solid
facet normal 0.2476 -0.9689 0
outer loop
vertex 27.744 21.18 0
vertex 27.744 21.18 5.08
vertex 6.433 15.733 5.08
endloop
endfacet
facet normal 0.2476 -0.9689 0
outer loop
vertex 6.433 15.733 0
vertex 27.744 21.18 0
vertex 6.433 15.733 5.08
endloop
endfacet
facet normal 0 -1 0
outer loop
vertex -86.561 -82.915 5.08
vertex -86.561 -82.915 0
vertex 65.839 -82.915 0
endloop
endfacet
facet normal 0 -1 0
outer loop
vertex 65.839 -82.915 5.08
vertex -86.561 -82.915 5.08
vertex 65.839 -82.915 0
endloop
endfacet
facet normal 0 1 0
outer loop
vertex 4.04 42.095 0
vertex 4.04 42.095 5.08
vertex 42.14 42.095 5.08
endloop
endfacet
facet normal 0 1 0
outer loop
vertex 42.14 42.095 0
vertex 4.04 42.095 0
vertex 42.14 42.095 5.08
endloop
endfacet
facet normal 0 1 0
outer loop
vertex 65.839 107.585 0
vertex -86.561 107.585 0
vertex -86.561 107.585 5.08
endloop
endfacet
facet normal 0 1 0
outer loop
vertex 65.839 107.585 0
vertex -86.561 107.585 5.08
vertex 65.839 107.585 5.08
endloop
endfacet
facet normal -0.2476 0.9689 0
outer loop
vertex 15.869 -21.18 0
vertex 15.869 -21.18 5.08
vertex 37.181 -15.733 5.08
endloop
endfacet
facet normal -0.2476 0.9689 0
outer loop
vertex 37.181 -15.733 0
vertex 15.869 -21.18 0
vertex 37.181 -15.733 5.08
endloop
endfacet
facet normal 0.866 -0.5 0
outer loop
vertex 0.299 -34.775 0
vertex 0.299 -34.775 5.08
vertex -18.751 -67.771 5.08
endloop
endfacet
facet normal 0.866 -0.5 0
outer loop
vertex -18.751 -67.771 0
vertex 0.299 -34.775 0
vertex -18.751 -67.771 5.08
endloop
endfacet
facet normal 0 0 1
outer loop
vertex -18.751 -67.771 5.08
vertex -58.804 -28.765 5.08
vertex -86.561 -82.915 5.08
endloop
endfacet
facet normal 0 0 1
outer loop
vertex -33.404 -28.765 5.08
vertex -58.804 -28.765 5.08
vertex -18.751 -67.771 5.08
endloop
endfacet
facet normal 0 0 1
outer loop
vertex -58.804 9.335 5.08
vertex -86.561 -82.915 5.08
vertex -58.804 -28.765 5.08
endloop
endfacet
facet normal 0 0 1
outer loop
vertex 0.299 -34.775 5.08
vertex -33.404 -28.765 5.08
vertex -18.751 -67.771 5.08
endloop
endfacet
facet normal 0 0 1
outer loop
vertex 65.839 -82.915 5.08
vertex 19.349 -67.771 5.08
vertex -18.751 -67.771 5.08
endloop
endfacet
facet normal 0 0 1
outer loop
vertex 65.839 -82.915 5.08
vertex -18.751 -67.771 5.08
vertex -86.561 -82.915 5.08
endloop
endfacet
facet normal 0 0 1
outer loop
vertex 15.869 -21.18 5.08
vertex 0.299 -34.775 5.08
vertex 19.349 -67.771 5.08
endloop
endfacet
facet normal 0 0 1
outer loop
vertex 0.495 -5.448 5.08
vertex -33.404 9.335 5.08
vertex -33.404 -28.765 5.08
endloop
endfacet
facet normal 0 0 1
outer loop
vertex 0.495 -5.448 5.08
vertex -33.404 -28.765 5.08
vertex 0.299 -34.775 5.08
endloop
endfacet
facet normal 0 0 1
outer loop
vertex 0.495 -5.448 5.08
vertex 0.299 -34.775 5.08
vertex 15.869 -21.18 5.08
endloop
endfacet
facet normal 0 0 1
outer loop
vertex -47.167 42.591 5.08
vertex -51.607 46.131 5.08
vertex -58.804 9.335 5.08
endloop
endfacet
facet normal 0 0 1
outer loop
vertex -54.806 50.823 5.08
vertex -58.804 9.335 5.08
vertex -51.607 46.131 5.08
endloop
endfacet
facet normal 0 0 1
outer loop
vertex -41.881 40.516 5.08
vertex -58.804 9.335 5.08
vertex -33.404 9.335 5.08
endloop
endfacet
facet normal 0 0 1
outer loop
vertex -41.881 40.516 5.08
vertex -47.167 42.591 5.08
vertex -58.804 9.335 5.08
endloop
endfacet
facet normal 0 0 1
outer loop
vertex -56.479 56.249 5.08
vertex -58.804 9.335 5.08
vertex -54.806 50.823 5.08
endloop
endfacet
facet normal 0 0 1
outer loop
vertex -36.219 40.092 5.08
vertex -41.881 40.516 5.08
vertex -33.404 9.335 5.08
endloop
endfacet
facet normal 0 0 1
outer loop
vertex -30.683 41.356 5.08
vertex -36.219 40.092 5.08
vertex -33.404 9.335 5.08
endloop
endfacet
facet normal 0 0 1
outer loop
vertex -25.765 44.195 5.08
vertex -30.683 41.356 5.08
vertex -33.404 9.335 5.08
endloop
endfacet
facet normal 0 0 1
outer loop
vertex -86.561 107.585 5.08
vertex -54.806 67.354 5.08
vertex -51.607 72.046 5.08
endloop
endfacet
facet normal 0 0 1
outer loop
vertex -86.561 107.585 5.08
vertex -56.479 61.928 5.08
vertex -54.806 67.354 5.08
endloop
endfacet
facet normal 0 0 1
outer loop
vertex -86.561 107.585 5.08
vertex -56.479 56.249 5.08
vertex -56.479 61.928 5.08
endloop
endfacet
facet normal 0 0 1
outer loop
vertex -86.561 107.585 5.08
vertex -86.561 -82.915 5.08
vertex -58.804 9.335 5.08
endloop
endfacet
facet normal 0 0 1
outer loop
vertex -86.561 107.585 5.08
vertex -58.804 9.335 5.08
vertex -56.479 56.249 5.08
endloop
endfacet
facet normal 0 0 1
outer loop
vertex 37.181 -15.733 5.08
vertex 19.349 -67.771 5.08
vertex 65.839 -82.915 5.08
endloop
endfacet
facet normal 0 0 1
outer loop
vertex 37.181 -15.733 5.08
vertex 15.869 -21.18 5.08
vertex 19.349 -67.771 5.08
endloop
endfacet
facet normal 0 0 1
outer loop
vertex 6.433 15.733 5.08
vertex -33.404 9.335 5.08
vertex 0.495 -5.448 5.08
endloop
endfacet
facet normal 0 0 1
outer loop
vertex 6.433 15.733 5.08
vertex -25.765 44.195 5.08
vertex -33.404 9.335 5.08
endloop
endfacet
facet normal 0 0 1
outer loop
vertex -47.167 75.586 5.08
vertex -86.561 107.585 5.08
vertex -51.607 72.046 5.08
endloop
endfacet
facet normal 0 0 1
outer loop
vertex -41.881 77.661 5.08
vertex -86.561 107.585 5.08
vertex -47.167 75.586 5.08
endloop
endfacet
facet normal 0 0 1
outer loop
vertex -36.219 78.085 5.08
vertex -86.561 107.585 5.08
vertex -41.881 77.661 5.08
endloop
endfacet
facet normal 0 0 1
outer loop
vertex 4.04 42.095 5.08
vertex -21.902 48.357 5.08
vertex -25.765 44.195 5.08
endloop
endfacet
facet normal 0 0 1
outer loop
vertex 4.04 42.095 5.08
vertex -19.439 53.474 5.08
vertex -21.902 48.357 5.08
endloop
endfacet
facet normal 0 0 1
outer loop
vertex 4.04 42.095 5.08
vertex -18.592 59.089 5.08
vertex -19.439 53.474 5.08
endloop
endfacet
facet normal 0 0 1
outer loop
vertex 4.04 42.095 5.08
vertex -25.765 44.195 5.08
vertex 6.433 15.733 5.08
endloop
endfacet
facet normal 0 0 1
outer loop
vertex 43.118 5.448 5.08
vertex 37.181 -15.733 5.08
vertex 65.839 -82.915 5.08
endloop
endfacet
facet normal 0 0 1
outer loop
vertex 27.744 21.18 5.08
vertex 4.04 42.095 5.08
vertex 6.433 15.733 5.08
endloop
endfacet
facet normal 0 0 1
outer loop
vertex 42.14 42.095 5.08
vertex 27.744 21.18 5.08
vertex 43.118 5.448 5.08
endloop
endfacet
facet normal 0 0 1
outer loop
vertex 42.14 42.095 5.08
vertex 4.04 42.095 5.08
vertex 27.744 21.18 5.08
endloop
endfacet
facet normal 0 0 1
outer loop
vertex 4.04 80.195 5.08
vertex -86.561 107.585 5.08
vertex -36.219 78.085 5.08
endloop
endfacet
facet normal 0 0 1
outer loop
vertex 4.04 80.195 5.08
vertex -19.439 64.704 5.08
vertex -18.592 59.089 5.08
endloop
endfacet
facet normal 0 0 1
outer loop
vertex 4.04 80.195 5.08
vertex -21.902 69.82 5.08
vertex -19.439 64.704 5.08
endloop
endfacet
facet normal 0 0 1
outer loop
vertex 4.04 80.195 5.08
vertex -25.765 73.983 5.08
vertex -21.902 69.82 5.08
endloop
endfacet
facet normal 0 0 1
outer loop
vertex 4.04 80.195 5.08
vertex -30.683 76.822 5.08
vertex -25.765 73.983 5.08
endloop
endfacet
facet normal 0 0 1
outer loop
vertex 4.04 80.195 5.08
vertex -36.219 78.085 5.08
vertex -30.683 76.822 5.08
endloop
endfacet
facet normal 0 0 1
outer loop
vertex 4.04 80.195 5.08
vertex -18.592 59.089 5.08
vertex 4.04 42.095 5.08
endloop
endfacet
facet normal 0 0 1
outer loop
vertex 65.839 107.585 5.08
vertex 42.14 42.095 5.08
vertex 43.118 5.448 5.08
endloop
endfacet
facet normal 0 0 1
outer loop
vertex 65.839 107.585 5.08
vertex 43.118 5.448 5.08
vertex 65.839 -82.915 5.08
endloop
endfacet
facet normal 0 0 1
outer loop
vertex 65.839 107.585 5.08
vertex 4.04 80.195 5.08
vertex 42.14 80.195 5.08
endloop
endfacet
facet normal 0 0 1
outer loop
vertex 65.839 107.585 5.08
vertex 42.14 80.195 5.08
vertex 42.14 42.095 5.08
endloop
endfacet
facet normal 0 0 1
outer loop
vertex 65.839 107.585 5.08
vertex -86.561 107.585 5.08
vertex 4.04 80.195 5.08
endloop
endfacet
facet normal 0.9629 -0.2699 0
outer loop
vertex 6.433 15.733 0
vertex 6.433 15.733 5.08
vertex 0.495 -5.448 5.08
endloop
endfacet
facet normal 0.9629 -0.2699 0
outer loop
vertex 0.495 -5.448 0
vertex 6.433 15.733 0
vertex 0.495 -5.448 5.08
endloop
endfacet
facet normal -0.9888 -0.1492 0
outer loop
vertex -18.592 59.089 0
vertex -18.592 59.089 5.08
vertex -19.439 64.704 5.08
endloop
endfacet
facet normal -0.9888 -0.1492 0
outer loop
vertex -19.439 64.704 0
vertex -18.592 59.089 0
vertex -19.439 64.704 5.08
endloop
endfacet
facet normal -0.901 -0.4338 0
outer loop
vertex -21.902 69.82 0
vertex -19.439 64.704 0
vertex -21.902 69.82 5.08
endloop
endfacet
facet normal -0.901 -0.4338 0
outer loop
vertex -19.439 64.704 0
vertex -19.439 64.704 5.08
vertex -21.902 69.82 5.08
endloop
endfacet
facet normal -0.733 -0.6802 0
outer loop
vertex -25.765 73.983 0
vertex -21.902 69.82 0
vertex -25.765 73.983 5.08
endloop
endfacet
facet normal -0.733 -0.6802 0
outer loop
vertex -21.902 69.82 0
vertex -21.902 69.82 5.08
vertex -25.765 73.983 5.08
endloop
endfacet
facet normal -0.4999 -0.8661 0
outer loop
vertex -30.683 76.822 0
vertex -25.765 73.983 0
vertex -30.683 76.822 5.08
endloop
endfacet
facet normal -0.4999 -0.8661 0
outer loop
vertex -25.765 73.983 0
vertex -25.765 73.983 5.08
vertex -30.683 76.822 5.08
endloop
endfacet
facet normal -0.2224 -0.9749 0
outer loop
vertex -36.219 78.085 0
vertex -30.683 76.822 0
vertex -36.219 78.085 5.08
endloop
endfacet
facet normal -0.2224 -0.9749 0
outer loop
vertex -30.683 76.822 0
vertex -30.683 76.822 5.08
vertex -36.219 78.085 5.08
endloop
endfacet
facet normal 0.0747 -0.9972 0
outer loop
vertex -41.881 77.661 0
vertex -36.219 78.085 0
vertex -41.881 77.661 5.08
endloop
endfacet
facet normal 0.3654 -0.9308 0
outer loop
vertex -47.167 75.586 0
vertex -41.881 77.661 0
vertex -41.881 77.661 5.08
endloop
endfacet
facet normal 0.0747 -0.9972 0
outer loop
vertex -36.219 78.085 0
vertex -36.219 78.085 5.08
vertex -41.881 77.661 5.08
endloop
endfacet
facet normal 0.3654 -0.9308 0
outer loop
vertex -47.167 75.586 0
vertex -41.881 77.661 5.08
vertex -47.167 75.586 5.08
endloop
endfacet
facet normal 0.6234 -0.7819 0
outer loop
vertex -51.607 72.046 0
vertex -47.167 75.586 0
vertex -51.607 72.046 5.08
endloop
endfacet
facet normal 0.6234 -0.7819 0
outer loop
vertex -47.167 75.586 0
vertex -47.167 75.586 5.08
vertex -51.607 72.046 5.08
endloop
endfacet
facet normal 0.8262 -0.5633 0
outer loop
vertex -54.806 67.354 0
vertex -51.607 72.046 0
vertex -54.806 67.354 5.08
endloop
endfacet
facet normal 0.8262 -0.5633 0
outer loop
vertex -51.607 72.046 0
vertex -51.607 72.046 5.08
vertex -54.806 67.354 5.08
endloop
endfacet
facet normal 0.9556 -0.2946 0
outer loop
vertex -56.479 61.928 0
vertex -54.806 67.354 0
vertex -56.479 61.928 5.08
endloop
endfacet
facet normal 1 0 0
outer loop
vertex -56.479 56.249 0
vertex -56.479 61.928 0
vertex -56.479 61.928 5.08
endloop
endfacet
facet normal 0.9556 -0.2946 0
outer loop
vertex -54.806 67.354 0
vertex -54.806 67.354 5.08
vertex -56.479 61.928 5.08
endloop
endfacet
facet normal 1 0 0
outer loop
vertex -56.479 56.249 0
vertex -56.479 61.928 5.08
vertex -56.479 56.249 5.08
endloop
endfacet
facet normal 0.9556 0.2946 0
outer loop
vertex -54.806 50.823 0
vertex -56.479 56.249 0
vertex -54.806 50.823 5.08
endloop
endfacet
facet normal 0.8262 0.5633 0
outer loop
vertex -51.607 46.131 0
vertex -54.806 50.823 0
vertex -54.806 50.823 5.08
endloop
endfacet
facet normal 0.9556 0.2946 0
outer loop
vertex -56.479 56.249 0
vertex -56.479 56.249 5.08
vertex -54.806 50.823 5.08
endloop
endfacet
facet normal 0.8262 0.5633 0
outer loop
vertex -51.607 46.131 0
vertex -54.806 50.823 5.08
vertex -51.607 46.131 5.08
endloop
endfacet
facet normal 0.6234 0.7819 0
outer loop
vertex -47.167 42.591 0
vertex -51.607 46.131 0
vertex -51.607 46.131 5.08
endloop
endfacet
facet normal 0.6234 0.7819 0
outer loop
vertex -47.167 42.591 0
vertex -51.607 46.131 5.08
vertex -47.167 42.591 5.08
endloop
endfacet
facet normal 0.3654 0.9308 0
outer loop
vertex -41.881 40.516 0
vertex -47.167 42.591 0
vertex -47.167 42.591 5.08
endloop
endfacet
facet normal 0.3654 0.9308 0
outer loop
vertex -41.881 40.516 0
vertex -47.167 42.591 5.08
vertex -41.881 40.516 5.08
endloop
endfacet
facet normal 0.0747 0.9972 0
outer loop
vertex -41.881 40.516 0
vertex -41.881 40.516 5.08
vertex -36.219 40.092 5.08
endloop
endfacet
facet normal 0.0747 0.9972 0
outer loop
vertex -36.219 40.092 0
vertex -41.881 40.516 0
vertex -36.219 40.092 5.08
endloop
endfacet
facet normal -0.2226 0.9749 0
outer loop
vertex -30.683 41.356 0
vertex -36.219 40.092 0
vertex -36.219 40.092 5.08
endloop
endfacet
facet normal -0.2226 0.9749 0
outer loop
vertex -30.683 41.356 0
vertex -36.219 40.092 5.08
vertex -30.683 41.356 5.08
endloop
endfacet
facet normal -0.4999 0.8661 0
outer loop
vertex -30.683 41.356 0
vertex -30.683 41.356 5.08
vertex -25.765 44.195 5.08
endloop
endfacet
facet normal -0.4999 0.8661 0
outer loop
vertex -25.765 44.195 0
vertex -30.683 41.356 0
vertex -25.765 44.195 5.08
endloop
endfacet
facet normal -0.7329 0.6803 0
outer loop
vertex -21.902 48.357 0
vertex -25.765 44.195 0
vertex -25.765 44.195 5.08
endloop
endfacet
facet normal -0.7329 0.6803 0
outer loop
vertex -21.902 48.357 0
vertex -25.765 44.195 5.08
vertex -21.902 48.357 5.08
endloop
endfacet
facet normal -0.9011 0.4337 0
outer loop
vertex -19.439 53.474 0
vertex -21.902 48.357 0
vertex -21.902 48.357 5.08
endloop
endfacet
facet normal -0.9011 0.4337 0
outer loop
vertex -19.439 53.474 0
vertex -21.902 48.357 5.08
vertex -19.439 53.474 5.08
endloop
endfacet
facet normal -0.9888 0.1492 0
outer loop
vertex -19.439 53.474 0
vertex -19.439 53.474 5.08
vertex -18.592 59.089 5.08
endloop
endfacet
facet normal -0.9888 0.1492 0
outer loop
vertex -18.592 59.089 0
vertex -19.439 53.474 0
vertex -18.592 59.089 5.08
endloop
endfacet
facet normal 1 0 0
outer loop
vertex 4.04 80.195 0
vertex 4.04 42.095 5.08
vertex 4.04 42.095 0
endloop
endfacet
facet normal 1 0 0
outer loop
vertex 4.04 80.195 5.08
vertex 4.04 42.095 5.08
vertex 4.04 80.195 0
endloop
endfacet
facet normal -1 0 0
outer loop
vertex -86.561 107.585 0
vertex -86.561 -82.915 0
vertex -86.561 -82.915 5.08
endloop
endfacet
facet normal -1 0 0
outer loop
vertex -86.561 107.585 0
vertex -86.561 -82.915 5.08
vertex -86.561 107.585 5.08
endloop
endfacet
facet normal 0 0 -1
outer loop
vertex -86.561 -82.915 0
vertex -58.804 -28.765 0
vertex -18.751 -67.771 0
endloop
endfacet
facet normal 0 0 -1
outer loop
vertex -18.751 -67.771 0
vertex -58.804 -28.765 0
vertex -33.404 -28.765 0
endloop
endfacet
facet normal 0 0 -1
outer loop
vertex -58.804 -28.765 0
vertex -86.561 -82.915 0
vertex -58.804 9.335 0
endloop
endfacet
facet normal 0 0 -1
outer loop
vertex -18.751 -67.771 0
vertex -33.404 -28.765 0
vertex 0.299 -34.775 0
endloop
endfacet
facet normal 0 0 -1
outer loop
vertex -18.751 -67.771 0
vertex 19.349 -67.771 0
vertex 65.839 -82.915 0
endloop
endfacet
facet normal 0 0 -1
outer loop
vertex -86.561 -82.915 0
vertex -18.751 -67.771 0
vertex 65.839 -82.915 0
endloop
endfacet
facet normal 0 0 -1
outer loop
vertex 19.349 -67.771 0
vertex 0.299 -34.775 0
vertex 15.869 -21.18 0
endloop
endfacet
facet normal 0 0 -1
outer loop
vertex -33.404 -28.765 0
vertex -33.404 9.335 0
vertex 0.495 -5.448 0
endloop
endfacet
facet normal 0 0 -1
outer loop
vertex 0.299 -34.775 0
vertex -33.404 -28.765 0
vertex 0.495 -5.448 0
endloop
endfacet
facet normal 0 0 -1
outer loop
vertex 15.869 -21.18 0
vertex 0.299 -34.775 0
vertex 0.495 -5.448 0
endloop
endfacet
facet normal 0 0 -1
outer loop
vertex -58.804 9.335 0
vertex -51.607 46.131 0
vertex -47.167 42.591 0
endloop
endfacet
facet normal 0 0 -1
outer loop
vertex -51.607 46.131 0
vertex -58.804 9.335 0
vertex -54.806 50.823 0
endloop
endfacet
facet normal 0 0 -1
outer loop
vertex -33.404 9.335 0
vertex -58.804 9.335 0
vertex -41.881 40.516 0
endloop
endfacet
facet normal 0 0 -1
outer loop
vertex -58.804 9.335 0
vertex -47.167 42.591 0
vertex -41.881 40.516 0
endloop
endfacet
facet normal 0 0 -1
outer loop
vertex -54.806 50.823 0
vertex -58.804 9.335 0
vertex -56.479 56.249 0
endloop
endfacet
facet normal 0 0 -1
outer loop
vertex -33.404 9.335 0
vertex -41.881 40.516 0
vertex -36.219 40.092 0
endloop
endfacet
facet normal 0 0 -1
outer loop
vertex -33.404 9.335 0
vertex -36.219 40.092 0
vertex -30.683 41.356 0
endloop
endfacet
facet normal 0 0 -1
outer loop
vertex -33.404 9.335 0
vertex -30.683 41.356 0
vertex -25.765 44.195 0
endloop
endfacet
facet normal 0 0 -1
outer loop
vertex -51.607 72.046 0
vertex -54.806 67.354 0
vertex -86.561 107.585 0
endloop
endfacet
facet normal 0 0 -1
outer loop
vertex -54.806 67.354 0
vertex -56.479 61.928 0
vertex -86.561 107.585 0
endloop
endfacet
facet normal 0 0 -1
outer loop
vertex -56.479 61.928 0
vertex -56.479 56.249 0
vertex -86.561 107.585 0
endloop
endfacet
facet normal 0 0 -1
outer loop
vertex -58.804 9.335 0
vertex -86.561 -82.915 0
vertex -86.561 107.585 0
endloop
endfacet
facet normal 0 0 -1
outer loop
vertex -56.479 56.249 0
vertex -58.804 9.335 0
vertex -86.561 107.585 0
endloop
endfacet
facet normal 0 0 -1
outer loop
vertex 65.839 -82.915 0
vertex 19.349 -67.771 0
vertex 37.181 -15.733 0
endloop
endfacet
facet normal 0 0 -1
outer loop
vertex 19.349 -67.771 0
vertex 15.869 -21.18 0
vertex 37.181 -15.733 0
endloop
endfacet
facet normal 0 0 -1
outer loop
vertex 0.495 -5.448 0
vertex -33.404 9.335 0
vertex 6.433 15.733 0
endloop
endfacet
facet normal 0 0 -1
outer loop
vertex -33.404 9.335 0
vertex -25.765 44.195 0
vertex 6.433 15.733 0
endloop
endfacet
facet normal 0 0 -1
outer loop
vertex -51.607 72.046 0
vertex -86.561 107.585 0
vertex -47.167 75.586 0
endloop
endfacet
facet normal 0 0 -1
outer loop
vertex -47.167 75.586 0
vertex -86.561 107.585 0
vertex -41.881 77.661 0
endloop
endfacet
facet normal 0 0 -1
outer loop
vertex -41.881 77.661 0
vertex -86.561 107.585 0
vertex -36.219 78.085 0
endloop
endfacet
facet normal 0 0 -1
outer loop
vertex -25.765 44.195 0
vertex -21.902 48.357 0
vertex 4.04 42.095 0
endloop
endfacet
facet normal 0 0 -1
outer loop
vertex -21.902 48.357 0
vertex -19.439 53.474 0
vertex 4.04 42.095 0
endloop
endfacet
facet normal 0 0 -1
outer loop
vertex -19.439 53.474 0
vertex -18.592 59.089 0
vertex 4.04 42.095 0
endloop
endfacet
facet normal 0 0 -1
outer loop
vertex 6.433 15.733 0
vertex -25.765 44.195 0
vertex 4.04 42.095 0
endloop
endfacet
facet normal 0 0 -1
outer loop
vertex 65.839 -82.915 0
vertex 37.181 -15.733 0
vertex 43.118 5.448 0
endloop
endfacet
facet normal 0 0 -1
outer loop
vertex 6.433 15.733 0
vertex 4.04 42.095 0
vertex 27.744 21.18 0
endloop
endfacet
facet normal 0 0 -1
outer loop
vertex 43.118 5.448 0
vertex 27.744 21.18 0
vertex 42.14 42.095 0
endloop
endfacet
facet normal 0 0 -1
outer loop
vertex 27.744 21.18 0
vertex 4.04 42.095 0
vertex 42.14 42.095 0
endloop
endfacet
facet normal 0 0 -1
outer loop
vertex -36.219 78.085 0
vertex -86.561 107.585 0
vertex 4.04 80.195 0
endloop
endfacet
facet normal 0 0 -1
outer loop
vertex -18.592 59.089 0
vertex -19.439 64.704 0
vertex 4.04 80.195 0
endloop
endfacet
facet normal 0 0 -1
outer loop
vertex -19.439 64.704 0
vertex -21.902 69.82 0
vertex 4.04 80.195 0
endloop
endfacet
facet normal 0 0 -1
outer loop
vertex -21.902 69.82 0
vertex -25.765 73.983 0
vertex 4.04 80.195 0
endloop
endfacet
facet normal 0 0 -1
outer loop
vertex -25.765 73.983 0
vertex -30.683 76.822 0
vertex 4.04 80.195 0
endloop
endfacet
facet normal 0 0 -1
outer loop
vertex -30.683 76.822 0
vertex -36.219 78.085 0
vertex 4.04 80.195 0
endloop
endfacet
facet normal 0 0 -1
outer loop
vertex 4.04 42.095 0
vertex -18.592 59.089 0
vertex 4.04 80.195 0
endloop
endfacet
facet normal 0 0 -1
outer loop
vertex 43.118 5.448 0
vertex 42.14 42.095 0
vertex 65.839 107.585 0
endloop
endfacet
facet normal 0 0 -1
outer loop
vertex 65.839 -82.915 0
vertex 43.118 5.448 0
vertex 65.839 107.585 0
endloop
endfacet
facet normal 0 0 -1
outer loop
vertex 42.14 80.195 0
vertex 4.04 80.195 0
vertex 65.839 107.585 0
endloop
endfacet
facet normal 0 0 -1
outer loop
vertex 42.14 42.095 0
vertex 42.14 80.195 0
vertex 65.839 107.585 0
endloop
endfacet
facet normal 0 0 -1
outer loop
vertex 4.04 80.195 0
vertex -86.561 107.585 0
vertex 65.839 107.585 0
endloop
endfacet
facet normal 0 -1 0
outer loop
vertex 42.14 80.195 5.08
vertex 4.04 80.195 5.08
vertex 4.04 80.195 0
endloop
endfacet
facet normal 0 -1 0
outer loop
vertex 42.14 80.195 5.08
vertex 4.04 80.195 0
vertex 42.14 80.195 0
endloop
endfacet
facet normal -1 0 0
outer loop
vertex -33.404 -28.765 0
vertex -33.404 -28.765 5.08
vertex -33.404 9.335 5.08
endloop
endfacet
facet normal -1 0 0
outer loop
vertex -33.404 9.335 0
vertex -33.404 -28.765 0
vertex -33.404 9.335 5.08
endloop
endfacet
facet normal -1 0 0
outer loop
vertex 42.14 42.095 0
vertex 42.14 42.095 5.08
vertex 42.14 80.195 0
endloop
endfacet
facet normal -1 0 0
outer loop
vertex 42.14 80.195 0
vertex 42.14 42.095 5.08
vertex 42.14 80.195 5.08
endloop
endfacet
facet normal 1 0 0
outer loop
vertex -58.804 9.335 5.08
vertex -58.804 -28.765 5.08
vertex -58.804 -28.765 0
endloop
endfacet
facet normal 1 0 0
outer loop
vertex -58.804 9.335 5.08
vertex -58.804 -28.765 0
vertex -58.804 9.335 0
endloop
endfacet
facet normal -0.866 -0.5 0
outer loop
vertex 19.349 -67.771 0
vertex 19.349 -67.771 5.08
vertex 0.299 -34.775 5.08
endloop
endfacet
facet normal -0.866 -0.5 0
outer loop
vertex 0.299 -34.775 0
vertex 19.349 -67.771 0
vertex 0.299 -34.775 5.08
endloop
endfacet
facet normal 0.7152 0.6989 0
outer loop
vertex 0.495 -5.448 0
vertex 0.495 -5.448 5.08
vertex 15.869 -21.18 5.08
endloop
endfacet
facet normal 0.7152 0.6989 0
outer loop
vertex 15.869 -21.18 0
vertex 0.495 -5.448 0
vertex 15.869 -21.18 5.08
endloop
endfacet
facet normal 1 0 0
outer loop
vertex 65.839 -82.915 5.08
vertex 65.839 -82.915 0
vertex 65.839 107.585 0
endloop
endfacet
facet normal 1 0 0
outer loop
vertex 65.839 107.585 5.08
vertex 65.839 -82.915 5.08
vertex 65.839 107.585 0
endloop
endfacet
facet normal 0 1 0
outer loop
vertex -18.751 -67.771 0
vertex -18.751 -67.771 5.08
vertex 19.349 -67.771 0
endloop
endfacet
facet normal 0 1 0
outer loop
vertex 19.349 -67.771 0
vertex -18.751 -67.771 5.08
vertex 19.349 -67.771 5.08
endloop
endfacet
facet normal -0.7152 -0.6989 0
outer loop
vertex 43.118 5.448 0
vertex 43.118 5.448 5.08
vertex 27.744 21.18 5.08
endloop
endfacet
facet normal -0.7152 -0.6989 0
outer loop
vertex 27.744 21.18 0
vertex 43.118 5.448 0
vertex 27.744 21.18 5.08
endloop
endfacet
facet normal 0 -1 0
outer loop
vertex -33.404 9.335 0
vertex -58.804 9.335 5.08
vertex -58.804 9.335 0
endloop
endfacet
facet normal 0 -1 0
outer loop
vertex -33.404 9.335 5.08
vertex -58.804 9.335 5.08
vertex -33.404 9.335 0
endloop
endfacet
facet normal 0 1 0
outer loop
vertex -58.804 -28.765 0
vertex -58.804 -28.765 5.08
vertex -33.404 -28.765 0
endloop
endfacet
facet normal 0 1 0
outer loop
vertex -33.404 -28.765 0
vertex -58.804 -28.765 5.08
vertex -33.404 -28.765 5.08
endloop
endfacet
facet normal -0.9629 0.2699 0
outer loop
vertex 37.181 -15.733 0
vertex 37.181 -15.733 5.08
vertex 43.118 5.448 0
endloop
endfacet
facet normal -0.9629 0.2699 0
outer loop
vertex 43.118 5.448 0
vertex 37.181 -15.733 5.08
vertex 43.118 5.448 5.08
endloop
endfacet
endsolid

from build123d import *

# Parameters (mm, degrees)
F0_W     = 152.4
F0_H     = 190.5
F1_DEPTH = 5.08
F2_W     = 38.1
F2_H     = 38.1
F2_R     = 19.05
F2_W_2   = 25.4
F3_DEPTH = 25.4


with BuildPart() as f1:
    # F0 (on Top) → F1 (new body)
    with BuildSketch(Plane.XY):
        with Locations((-10.361006, 12.33527)):
            Rectangle(F0_W, F0_H)
    extrude(amount=F1_DEPTH)

    # F2 (on face) → F3 (cut)
    with BuildSketch(Plane.XY.offset(5.08)):
        with Locations((23.089969, 61.145121)):
            Rectangle(F2_W, F2_H)
        Polygon((19.348822, -67.770637), (0.298822, -34.775069), (-18.751178, -67.770637), align=None)
        with Locations((-37.642254, 59.088646)):
            Circle(F2_R)
        Polygon((15.868925, -21.180481), (37.180649, -15.732507), (43.118428, 5.447974), (27.744482, 21.180481), (6.432758, 15.732507), (0.49498, -5.447974), align=None)
        with Locations((-46.103996, -9.714661)):
            Rectangle(F2_W_2, F2_H)
    extrude(amount=-F3_DEPTH, mode=Mode.SUBTRACT)


solid = f1.part
